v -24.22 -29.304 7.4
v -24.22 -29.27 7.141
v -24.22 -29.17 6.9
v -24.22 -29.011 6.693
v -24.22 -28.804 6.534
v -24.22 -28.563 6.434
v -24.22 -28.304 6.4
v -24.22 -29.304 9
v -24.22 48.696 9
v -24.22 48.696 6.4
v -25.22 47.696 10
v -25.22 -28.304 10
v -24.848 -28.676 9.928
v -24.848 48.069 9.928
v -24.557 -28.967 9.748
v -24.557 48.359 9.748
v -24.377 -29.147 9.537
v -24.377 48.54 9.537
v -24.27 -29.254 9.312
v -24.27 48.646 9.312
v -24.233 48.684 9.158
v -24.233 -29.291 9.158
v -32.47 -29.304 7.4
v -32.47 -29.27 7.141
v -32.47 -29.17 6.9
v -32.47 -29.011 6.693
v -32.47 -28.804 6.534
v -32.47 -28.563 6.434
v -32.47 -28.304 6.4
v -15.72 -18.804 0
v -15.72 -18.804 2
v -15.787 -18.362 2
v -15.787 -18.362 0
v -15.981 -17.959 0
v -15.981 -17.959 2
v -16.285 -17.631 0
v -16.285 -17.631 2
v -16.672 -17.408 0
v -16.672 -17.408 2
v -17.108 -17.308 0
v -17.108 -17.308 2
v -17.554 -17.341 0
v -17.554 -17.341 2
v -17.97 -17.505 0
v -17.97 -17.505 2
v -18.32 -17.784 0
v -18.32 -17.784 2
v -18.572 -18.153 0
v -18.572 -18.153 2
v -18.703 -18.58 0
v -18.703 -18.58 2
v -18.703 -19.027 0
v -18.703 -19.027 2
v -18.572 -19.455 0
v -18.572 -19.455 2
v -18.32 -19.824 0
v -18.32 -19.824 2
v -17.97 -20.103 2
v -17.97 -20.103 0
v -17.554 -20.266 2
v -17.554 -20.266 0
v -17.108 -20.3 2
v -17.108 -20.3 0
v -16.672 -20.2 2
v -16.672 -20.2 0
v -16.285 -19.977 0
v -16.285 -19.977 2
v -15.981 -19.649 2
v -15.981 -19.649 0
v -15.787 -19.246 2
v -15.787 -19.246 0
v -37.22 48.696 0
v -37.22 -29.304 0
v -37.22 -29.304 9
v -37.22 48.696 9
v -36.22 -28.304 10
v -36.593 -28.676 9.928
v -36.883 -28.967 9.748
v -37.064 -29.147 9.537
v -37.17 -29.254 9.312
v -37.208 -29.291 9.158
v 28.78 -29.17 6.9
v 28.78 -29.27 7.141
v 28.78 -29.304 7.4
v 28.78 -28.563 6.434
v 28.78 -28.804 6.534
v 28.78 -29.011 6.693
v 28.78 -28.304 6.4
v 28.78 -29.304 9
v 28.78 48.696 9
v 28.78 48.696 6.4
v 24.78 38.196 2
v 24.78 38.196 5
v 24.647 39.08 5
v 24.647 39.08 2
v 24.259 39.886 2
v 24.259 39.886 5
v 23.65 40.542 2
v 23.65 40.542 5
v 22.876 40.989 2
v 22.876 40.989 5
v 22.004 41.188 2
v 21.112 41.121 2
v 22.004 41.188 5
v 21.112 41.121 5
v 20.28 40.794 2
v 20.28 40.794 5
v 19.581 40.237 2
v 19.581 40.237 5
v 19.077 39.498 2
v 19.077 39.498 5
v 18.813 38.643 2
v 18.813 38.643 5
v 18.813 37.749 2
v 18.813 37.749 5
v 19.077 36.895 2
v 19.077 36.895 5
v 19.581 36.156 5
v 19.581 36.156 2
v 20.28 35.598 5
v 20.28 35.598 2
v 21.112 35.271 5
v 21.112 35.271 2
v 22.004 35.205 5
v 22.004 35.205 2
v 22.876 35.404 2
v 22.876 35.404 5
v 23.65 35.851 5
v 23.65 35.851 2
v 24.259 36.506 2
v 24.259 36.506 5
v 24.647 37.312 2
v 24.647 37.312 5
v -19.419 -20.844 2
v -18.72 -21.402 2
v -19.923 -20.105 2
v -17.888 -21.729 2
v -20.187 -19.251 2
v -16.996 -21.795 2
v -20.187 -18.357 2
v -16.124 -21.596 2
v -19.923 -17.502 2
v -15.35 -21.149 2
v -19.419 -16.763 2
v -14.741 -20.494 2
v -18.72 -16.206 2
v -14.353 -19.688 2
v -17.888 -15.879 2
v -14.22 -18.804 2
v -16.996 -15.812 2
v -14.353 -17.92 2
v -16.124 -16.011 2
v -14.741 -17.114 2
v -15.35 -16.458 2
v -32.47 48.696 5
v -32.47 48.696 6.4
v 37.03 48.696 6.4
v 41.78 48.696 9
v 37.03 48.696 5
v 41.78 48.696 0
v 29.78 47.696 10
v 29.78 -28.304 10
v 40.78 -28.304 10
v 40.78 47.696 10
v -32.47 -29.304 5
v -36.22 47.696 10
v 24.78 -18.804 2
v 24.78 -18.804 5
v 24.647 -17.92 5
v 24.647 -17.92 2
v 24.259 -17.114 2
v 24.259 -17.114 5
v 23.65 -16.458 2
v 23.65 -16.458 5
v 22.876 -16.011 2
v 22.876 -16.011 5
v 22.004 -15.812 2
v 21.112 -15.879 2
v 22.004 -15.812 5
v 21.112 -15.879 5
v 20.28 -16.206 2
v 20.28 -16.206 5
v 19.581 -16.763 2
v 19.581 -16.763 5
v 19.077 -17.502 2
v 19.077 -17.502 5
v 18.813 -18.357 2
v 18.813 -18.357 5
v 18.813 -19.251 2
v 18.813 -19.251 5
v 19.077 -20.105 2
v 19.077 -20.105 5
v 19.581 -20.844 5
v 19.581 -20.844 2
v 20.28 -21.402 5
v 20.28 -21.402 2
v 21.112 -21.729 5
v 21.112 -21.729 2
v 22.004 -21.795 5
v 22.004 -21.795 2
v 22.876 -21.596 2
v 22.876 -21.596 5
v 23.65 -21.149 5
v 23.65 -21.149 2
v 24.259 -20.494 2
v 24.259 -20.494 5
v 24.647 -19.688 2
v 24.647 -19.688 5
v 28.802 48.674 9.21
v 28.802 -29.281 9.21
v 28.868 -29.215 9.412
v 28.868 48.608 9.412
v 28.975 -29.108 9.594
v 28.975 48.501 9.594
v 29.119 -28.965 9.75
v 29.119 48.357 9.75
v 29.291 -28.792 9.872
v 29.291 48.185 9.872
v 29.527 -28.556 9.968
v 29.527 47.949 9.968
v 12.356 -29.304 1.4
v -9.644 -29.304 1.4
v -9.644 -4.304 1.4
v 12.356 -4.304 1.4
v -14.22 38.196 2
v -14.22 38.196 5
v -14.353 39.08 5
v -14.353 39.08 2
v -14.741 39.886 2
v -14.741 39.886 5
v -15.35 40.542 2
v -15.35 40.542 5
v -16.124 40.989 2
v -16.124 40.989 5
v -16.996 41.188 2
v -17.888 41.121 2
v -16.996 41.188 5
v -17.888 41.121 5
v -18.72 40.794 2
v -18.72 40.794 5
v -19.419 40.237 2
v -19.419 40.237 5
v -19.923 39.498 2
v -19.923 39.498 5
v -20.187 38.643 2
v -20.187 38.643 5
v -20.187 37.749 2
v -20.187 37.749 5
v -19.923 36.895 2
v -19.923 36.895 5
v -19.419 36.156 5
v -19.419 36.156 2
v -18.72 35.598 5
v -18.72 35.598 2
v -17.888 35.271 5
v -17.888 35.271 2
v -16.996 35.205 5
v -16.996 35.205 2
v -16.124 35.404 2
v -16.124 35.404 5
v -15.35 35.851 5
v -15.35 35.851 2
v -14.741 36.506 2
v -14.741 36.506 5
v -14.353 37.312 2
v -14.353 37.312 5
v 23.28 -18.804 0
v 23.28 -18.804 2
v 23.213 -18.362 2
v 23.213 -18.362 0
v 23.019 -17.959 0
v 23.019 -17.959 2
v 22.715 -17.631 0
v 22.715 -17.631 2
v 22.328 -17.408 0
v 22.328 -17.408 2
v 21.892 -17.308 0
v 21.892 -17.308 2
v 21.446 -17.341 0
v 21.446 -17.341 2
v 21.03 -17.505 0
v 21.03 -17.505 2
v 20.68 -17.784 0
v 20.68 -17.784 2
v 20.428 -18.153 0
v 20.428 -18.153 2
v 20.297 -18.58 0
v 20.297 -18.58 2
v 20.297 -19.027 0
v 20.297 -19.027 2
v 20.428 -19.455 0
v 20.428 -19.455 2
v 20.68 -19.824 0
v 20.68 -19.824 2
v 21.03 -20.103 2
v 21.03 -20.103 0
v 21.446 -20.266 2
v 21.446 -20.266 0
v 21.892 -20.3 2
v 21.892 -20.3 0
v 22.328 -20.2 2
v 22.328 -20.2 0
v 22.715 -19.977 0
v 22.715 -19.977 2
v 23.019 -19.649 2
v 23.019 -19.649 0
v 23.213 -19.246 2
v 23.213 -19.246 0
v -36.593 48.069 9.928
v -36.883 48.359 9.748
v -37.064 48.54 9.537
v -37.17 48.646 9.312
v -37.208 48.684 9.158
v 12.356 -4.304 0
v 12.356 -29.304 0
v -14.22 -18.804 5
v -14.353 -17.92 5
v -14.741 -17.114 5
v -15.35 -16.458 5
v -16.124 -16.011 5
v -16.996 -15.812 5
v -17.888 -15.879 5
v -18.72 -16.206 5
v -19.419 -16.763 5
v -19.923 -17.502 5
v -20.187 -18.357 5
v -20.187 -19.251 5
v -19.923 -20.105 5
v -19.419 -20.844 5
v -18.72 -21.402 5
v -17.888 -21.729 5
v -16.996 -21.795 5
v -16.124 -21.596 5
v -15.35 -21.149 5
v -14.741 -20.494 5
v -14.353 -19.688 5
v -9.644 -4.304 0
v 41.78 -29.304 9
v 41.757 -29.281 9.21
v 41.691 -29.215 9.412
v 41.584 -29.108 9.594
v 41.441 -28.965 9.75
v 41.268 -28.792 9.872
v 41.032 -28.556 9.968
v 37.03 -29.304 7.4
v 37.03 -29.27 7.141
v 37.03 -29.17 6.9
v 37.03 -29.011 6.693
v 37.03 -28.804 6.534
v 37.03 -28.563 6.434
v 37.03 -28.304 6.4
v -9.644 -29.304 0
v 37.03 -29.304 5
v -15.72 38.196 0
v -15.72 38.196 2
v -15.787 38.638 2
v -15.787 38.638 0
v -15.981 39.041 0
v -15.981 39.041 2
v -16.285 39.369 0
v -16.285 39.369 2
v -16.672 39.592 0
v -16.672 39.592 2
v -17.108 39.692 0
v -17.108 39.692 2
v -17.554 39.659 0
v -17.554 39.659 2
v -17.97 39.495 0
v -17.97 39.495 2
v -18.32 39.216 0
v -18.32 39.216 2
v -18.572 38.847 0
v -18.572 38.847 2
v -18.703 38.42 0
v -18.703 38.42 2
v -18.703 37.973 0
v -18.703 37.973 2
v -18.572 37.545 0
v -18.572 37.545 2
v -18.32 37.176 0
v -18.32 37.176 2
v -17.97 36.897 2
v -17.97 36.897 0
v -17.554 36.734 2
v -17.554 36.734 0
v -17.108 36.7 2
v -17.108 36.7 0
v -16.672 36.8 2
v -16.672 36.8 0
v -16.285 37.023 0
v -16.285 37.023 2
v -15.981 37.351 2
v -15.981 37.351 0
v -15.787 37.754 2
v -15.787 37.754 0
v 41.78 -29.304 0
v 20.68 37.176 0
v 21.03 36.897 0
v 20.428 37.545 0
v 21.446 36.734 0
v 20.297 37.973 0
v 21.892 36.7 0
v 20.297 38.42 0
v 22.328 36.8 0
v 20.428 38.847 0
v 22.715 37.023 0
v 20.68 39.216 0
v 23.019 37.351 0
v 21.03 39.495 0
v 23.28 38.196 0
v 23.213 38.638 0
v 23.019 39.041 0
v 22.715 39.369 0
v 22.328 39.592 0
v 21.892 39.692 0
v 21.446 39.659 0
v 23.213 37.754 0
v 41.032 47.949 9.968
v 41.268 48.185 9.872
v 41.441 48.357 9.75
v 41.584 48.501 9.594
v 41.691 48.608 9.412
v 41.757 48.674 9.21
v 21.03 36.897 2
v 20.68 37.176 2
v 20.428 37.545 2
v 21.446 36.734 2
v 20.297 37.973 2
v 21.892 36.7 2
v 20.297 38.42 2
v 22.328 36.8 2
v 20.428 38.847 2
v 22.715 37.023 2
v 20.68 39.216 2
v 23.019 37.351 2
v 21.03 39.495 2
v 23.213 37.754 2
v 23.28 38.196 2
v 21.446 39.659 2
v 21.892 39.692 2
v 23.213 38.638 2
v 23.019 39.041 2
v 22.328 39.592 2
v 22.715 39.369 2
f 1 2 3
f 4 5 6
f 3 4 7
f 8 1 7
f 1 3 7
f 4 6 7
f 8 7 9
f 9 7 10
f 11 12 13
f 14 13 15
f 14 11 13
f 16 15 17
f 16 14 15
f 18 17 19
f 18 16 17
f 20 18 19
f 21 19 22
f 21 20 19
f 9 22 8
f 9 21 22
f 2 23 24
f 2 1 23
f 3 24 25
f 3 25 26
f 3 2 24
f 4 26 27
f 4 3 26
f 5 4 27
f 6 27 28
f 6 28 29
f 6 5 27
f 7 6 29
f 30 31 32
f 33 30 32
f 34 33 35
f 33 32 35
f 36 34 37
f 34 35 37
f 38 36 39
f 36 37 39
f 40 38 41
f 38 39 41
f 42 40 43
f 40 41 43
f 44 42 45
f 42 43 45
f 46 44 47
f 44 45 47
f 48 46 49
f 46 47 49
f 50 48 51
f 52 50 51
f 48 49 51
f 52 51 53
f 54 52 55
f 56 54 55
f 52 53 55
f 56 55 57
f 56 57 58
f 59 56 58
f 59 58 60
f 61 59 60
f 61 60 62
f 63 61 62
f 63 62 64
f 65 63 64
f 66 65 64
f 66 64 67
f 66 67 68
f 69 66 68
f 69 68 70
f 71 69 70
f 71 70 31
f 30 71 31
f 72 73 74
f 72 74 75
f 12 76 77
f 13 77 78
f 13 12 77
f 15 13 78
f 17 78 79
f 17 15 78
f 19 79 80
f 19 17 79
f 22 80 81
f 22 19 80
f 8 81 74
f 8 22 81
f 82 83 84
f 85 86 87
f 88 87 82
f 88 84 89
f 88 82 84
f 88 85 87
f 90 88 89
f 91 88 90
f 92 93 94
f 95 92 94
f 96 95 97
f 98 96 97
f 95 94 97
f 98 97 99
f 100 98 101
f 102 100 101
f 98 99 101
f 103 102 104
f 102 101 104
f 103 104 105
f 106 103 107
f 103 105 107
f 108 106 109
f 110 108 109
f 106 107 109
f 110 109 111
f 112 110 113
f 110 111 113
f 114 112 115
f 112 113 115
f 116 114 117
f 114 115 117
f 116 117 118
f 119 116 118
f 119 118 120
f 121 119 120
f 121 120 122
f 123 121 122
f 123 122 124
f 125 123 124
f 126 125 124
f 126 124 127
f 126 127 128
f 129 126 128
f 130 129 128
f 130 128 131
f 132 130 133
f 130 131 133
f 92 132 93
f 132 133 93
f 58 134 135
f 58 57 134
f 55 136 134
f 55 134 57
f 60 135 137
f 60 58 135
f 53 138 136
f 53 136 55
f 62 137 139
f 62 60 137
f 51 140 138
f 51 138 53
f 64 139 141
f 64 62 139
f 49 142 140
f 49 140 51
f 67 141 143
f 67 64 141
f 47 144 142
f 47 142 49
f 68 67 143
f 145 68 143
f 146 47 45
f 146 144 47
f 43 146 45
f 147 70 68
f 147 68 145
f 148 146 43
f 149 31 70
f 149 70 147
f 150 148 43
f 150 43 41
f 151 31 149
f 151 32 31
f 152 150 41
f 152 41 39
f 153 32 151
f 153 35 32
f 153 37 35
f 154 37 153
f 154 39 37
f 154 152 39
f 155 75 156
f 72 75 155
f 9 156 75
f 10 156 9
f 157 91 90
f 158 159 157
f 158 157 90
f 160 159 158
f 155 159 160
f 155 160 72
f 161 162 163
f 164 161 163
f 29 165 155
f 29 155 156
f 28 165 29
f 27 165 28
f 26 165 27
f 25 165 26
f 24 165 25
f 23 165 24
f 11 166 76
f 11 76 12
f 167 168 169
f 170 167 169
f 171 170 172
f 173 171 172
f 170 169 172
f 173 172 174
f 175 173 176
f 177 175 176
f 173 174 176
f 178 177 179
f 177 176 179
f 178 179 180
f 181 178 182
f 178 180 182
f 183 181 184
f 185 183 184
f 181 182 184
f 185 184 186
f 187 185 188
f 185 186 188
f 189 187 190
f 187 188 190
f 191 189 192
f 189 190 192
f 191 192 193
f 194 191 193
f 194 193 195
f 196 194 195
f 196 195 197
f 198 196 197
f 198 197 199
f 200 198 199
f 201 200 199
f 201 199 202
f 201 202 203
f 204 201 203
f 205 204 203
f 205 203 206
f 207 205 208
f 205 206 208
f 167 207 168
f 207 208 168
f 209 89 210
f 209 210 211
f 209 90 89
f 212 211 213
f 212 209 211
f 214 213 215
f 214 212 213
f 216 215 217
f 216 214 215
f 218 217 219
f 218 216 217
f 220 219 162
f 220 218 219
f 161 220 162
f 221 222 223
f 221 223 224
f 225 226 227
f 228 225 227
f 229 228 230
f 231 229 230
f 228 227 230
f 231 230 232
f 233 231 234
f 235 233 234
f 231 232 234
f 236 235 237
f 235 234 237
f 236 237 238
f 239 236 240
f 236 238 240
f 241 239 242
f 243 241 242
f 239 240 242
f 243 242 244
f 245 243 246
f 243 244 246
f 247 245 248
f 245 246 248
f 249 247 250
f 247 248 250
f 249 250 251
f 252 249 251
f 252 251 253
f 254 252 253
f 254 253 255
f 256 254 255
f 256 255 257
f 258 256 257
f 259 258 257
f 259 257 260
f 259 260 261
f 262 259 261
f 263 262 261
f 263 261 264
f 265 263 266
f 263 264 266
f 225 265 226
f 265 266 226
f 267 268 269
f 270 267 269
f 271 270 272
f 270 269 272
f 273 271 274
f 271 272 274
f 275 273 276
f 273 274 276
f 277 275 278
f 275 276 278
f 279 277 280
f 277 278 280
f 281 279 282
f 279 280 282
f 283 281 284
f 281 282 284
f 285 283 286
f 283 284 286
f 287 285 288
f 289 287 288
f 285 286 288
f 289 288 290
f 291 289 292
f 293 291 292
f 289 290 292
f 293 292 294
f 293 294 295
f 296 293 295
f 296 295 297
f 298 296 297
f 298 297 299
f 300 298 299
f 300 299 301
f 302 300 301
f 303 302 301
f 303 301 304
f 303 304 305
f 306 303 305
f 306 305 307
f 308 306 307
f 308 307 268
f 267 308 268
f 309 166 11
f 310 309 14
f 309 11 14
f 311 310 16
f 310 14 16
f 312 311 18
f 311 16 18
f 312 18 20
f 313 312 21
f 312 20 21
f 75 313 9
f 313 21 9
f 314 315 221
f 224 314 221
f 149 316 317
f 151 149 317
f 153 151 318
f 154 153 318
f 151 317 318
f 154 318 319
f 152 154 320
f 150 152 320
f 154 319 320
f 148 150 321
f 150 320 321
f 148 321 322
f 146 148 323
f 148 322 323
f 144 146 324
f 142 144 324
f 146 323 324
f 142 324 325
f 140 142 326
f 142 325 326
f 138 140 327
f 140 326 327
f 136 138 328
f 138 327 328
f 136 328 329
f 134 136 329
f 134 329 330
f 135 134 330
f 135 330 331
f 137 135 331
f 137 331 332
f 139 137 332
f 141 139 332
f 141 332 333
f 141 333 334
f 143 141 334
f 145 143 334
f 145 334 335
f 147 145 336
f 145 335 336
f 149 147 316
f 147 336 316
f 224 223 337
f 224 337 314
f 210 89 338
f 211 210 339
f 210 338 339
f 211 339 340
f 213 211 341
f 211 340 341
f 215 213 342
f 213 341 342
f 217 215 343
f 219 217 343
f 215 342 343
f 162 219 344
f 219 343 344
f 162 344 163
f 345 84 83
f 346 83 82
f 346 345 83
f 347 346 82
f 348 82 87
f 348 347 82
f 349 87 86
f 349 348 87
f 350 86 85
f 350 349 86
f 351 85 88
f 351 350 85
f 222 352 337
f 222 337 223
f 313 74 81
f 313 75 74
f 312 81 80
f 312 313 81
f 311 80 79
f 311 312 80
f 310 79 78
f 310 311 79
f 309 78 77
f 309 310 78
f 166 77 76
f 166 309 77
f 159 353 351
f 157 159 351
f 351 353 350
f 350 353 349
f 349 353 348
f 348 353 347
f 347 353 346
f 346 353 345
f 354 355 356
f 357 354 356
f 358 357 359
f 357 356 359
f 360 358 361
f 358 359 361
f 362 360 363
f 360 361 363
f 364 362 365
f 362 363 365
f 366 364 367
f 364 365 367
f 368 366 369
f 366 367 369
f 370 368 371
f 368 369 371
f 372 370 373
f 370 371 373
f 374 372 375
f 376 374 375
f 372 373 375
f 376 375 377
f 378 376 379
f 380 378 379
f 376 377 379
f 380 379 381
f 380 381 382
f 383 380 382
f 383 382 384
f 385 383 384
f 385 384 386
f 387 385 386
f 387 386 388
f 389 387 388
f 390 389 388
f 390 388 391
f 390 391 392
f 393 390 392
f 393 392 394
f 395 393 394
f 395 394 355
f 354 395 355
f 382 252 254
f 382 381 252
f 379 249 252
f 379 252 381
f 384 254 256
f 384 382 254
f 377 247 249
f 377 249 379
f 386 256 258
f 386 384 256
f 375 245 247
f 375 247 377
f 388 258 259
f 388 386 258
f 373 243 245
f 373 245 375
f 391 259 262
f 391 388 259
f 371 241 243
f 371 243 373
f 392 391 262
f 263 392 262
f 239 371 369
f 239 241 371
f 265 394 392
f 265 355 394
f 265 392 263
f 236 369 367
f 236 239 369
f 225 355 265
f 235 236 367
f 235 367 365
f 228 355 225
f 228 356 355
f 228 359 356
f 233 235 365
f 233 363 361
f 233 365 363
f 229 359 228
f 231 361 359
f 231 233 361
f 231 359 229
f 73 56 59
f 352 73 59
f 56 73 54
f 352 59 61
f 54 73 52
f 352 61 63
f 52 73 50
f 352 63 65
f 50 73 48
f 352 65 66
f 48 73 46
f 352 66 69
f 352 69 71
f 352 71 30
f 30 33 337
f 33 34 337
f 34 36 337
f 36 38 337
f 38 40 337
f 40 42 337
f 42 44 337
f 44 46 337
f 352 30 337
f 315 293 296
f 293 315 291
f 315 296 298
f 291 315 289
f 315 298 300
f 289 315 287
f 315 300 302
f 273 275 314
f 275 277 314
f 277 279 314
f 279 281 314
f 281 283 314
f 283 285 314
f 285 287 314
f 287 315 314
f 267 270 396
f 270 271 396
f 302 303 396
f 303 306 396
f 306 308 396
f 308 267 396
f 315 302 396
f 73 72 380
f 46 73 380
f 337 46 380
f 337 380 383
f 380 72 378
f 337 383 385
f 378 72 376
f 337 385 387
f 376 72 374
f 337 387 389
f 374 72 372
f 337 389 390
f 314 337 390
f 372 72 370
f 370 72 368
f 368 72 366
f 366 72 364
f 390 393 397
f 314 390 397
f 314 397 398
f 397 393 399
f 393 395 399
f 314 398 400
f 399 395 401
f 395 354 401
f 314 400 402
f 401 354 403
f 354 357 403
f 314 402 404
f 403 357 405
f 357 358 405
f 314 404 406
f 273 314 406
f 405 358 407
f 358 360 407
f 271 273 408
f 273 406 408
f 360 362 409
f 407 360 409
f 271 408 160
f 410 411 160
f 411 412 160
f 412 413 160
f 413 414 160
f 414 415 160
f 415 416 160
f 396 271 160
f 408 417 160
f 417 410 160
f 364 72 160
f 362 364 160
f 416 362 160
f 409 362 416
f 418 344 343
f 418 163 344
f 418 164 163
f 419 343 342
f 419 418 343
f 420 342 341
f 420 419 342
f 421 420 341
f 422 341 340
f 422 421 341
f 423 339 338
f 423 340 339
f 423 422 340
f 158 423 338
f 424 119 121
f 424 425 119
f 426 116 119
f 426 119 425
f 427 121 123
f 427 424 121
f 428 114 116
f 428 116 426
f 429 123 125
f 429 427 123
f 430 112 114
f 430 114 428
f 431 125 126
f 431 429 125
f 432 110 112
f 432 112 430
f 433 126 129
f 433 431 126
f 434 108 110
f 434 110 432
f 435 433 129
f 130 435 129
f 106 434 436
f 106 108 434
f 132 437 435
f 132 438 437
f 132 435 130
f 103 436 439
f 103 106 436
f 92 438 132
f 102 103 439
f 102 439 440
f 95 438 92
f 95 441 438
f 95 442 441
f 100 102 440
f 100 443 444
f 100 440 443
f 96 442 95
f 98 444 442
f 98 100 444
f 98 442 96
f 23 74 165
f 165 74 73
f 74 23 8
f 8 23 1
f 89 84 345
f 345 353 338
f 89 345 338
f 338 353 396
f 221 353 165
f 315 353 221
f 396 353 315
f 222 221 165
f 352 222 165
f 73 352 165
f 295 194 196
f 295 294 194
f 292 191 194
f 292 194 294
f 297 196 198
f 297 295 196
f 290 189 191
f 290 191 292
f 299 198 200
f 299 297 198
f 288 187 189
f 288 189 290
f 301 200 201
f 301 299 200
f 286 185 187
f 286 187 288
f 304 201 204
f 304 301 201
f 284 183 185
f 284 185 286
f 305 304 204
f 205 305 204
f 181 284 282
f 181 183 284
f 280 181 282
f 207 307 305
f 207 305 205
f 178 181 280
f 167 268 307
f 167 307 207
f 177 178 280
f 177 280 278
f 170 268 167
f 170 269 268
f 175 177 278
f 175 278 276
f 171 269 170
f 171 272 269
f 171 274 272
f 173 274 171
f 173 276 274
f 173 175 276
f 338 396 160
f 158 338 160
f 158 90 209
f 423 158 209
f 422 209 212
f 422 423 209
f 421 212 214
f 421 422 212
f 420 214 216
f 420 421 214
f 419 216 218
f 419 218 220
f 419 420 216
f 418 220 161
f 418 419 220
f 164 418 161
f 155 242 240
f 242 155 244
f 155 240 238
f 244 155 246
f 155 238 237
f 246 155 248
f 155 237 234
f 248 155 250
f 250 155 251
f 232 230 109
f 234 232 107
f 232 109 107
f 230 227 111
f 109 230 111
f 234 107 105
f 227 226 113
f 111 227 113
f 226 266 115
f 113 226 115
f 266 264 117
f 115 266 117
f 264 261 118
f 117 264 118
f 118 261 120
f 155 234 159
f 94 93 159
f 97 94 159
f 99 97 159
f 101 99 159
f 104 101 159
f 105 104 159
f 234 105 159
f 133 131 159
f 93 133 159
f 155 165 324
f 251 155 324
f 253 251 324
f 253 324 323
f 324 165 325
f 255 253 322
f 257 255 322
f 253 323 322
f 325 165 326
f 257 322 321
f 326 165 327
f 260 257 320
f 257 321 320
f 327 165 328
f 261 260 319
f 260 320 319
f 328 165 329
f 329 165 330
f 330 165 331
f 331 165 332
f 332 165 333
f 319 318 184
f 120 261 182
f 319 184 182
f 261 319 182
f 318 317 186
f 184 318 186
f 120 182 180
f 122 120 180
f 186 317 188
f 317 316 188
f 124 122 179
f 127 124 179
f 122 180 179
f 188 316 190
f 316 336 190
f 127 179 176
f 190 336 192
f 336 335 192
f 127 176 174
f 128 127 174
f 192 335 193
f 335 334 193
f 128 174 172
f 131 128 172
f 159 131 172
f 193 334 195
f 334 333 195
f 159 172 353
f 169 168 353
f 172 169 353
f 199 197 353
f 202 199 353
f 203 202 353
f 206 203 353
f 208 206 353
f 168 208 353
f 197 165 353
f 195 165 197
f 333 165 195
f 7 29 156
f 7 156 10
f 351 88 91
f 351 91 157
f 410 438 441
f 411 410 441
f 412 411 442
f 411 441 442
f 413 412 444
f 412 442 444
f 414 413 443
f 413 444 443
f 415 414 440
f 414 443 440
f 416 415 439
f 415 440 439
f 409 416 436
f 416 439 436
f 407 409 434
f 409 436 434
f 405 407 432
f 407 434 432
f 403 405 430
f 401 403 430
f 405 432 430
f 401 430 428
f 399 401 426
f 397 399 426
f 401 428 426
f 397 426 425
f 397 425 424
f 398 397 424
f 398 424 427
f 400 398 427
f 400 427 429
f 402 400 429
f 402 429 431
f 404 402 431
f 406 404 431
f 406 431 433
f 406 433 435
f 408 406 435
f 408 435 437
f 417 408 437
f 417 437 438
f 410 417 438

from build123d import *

# Parameters (mm, degrees)
F0_W      = 79
F0_H      = 78
F1_DEPTH  = 5
F2_W      = 13
F2_H      = 78
F3_DEPTH  = 5
F4_W      = 8.25
F4_H      = 1.4
F5_DEPTH  = 78.001
F6_R      = 1.5
F7_DEPTH  = 30
F8_R      = 3
F9_DEPTH  = 3
F10_W     = 22
F10_H     = 1.4
F11_DEPTH = 25
F12_R     = 1


with BuildPart() as f1:
    # F0 (on Top) → F1 (new body)
    with BuildSketch(Plane.XY):
        with Locations((2.279855, 9.696156)):
            Rectangle(F0_W, F0_H)
    extrude(amount=F1_DEPTH)

    # F2 (on face) → F3 (join)
    with BuildSketch(Plane.XY.offset(5)):
        with Locations((-30.720145, 9.696156)):
            Rectangle(F2_W, F2_H)
        with Locations((35.279855, 9.696156)):
            Rectangle(F2_W, F2_H)
    extrude(amount=F3_DEPTH)

    # F4 (on face) → F5 (cut, through all)
    with BuildSketch(Plane.XZ.offset(29.303844)):
        with Locations((-28.345145, 5.7)):
            Rectangle(F4_W, F4_H)
        with Locations((32.904855, 5.7)):
            Rectangle(F4_W, F4_H)
    extrude(amount=-F5_DEPTH, mode=Mode.SUBTRACT)

    # F6 (on face) → F7 (cut)
    with BuildSketch(Plane.XY.offset(5)):
        with Locations((-17.220145, 38.196156)):
            Circle(F6_R)
        with Locations((21.779855, 38.196156)):
            Circle(F6_R)
        with Locations((-17.220145, -18.803844)):
            Circle(F6_R)
        with Locations((21.779855, -18.803844)):
            Circle(F6_R)
    extrude(amount=-F7_DEPTH, mode=Mode.SUBTRACT)

    # F8 (on face) → F9 (cut)
    with BuildSketch(Plane.XY.offset(5)):
        with Locations((-17.220145, 38.196156)):
            Circle(F8_R)
        with Locations((21.779855, 38.196156)):
            Circle(F8_R)
        with Locations((-17.220145, -18.803844)):
            Circle(F8_R)
        with Locations((21.779855, -18.803844)):
            Circle(F8_R)
    extrude(amount=-F9_DEPTH, mode=Mode.SUBTRACT)

    # F10 (on face) → F11 (cut)
    with BuildSketch(Plane.XZ.offset(29.303844)):
        with Locations((1.356391, 0.7)):
            Rectangle(F10_W, F10_H)
    extrude(amount=-F11_DEPTH, mode=Mode.SUBTRACT)

    # F12
    f12_edges = [f1.edges().sort_by_distance(p)[0] for p in [
        (-24.220145, 9.696156, 10),
        (28.779855, 9.696156, 10),
        (35.279855, -29.303844, 10),
        (-30.720145, -29.303844, 10),
        (-30.720145, 48.696156, 10),
        (35.279855, 48.696156, 10),
        (32.904855, -29.303844, 6.4),
        (-28.345145, -29.303844, 6.4),
        (41.779855, 9.696156, 10),
        (-37.220145, 9.696156, 10),
    ]]
    fillet(f12_edges, radius=F12_R)


solid = f1.part
